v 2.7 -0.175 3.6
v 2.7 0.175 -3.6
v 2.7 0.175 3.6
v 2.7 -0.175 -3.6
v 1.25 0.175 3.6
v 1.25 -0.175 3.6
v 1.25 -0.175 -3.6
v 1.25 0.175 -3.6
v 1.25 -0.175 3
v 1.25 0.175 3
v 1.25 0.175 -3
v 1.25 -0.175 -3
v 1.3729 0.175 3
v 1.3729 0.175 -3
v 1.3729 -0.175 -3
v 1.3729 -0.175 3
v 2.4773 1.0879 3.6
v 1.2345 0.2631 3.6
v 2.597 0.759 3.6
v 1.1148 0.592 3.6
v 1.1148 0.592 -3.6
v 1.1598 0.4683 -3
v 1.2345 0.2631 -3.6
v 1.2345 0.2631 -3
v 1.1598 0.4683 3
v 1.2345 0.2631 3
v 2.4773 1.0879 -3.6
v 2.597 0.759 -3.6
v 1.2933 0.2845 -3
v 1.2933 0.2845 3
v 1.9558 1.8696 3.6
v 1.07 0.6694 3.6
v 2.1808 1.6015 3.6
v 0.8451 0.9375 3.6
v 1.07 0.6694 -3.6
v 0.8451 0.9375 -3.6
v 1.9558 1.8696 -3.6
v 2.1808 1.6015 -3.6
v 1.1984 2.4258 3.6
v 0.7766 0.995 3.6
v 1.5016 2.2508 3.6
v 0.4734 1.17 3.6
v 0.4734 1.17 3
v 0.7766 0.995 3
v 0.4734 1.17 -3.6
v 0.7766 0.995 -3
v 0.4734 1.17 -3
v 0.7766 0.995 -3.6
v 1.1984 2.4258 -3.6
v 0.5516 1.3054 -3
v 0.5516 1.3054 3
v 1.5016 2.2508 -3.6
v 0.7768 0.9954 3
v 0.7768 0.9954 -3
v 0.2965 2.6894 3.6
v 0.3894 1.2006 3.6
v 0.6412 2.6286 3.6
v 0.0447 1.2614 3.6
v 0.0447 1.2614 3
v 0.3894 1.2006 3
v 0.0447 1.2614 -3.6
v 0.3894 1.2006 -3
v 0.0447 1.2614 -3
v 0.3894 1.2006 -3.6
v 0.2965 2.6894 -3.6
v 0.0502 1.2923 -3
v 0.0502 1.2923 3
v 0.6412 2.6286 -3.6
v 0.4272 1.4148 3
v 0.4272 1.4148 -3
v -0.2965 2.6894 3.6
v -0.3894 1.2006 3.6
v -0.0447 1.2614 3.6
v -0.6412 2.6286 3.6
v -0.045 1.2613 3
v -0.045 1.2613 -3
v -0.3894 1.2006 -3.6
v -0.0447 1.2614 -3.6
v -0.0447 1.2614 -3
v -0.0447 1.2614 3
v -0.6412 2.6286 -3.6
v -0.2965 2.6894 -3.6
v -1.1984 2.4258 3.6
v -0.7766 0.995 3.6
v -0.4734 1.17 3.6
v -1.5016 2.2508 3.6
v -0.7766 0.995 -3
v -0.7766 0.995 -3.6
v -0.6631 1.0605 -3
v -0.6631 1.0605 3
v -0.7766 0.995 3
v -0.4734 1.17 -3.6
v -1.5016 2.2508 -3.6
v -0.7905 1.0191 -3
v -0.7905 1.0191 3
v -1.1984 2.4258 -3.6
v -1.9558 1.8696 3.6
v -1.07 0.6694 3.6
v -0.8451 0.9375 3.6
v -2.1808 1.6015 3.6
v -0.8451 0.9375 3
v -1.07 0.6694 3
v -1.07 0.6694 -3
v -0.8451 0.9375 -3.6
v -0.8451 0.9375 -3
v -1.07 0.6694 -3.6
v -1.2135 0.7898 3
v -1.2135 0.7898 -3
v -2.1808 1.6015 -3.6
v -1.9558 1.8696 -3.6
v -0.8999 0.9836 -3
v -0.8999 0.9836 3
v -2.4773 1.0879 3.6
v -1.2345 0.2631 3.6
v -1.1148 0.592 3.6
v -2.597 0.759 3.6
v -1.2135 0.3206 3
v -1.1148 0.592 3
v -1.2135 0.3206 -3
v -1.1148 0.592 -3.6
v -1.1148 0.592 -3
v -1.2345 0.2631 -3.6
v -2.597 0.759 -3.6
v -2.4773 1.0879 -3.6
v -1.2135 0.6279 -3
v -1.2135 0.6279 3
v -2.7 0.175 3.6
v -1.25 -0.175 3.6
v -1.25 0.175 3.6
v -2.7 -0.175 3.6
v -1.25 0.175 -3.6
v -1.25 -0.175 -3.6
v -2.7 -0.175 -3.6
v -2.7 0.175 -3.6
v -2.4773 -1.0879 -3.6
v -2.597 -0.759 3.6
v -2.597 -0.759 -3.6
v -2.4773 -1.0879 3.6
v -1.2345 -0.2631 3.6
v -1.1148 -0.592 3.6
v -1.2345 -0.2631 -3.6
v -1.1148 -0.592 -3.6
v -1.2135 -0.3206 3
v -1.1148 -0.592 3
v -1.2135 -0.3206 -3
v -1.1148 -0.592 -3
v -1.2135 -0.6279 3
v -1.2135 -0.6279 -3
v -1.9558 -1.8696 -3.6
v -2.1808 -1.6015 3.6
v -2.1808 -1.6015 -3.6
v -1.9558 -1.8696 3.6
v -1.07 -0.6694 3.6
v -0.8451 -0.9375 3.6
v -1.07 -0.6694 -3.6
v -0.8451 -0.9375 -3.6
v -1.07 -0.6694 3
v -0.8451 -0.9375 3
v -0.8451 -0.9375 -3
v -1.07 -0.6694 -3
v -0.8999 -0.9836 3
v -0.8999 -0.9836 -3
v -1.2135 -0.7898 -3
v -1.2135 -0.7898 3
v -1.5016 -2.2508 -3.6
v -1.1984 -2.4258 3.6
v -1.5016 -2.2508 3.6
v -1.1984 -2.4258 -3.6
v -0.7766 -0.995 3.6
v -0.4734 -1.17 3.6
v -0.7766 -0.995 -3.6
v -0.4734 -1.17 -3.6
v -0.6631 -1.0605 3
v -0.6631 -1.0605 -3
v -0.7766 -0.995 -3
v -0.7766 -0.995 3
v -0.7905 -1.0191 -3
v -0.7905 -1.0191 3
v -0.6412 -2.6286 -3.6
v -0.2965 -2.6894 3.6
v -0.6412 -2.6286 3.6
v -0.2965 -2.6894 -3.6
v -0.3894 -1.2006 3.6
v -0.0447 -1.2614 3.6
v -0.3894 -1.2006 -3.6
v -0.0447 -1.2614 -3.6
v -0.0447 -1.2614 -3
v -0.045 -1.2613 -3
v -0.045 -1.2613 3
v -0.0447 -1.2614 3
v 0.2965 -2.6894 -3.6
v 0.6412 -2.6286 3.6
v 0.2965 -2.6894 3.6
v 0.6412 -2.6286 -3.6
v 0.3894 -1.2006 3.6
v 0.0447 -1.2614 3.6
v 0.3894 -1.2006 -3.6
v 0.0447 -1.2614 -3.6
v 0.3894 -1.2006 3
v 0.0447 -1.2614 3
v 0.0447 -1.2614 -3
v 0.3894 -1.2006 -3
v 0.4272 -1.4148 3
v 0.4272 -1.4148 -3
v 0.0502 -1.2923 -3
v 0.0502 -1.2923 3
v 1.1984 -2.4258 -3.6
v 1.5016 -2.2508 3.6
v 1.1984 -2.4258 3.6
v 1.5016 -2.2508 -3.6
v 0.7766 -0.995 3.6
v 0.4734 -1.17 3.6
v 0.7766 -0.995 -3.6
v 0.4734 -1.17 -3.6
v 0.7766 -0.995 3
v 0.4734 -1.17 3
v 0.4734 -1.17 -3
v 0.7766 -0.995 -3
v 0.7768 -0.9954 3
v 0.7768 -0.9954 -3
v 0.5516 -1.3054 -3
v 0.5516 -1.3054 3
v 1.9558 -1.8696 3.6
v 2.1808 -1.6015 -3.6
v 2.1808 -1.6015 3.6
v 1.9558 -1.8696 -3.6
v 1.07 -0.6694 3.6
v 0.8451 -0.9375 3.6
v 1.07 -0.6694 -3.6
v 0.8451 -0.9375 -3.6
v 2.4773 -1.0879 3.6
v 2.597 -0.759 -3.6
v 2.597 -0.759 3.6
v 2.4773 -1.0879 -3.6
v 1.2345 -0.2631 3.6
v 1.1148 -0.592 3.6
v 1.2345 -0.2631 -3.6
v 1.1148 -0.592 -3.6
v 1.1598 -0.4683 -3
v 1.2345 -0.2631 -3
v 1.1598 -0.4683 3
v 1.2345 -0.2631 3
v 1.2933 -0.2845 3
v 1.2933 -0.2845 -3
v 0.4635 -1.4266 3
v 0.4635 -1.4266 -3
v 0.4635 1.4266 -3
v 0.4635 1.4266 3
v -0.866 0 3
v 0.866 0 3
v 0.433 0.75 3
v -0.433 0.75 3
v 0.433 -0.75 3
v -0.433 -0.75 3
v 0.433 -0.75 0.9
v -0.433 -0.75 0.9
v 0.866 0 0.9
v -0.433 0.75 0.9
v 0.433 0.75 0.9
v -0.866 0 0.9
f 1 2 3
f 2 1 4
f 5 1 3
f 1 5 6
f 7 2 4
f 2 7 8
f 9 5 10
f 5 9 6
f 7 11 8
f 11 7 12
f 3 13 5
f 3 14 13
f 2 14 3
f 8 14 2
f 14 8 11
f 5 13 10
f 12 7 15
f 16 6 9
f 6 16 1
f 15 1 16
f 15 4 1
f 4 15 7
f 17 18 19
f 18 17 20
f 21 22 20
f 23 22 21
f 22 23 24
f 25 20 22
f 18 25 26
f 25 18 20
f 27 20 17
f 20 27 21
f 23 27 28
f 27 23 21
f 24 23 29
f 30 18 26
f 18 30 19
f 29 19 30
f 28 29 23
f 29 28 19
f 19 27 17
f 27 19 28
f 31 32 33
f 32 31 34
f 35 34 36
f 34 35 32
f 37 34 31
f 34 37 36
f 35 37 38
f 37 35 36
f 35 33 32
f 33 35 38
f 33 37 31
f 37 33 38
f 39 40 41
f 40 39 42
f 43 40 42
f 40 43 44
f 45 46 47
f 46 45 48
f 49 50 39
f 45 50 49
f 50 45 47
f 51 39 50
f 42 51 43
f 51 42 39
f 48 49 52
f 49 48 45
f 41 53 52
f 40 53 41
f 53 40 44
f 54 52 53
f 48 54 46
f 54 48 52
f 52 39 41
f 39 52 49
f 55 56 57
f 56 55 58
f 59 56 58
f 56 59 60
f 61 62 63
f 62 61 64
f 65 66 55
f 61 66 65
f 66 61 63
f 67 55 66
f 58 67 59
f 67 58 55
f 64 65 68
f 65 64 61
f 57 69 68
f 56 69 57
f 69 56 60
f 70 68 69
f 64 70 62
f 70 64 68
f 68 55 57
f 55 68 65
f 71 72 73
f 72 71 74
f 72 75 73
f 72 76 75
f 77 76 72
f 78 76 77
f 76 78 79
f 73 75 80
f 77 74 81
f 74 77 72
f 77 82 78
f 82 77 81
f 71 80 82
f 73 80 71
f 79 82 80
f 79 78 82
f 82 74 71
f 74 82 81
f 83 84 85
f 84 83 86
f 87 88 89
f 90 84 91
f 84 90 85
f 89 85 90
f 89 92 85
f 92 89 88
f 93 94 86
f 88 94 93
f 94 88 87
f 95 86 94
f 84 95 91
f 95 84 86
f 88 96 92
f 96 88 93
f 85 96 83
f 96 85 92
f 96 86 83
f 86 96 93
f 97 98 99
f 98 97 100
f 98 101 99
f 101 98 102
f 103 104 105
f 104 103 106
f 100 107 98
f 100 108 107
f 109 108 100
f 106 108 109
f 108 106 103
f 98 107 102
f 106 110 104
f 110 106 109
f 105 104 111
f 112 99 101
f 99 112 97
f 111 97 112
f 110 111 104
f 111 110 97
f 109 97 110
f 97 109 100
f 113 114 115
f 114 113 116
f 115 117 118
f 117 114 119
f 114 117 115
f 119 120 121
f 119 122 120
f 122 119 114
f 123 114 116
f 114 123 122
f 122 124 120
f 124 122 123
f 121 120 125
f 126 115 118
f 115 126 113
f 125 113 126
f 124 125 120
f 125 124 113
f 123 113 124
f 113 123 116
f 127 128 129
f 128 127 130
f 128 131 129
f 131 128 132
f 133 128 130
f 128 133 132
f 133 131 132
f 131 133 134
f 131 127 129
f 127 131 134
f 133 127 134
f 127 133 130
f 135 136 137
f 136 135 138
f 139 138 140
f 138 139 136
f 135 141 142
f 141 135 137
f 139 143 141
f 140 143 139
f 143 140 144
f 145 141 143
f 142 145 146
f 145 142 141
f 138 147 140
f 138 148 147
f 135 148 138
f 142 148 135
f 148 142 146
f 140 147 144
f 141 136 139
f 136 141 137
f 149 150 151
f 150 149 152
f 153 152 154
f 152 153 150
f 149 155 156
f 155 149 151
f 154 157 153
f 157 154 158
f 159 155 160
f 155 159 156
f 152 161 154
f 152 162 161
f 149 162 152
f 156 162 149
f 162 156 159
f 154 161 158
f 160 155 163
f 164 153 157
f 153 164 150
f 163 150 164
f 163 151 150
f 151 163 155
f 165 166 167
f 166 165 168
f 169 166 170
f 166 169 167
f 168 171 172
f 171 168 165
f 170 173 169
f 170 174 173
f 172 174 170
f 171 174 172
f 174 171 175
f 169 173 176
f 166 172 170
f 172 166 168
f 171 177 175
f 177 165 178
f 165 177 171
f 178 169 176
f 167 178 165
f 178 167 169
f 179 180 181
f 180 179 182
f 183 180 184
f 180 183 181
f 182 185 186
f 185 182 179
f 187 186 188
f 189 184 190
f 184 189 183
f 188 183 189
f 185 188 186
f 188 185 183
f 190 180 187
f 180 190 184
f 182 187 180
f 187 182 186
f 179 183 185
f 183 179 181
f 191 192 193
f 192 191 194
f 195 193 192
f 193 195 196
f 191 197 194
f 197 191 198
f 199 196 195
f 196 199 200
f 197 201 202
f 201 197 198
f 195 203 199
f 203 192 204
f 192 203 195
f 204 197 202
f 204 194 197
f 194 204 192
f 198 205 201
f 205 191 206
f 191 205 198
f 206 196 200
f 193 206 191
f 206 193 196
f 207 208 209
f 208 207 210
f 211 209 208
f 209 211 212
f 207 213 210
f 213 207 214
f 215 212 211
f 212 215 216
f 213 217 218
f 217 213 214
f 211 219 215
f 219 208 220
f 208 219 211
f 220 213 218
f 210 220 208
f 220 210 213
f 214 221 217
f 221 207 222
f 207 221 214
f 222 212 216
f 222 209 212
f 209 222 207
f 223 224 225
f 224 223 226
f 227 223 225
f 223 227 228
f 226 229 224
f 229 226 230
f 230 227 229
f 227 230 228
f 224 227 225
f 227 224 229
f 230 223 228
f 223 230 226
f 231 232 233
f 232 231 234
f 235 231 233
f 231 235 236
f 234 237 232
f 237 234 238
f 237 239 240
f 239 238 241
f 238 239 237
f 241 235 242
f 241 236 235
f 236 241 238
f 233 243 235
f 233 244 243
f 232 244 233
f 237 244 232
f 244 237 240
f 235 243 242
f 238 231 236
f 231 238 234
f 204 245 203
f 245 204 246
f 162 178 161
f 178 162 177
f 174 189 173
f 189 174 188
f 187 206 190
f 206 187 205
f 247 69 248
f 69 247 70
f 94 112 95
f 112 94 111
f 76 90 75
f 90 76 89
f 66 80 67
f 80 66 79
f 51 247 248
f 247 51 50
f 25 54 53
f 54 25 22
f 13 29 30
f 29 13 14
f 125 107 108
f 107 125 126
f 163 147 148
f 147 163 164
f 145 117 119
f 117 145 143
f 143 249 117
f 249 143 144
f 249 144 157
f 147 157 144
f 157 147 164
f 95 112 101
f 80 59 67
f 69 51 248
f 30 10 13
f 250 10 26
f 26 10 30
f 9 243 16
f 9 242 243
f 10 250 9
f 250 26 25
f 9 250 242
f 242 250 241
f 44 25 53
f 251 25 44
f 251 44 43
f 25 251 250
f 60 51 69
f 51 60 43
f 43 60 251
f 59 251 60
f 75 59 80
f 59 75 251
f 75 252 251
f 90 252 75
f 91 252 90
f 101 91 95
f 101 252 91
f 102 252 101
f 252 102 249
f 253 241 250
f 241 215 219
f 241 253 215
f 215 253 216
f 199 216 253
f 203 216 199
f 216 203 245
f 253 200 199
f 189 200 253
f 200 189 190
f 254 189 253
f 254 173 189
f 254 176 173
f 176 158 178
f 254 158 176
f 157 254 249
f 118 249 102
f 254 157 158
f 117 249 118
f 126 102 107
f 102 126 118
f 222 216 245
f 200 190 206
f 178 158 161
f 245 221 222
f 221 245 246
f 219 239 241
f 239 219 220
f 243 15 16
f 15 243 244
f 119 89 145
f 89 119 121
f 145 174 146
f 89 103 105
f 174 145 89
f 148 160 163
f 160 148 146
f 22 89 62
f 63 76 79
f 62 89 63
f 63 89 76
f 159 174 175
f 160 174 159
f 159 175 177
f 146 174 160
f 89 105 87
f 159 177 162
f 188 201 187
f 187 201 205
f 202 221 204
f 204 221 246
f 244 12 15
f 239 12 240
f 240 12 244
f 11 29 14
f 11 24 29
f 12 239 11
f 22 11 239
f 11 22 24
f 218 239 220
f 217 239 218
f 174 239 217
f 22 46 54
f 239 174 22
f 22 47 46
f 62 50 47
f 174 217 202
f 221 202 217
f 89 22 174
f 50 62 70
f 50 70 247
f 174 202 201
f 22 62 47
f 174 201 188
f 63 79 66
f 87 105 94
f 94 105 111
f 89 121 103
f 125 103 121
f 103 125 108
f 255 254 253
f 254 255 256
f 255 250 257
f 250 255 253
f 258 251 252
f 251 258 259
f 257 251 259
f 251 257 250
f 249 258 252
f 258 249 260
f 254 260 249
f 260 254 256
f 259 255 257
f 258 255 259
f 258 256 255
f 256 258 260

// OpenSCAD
// Parameters
nominal_diameter_mm = 3; //[1.5:6:0.1]
pitch_mm = 0.5; //[0.25:1:0.05]
length_mm = 6; //[3:24:1]
socket_across_flats_mm = 1.5; //[0.8:3:0.1]
socket_depth_mm = 1.5; //[0.8:4:0.1]
end_style_flat = 1; //[0:1:1]
show_threads = 1; //[0:1:1]
overlap_mm = 1.2; //[0.5:2:0.1]  // use 1-2mm overlap for robust connectivity
thread_major_d_mm = 3; //[1.5:6:0.1]
thread_major_r_mm = 1.5; //[0.75:3:0.05]
thread_minor_r_mm = 1.25; //[0.6:2.6:0.05]
socket_hex_radius_mm = 0.866; //[0.4:1.8:0.01]
point_length_mm = 1.2; //[0.6:3:0.1]
thread_ridge_height_mm = 0.25; //[0.1:0.6:0.05]
thread_ridge_width_mm = 0.35; //[0.15:0.8:0.05]
thread_ridge_count = 18; //[6:48:1]

// Screw - complete geometry (single connected solid)
module screw() {
  color("DimGray")
  union() {
    // Main grub screw body
    cylinder(r=thread_major_r_mm, h=length_mm, center=true);

    // External "thread ridges" (kept as in original style, but unioned)
    if (show_threads == 1) {
      for (i = [0:thread_ridge_count-1]) {
        rotate([0, 0, i*360/thread_ridge_count])
          translate([thread_major_r_mm - thread_ridge_height_mm/2 + overlap_mm/2, 0, 0])
            cube([thread_ridge_height_mm + overlap_mm, thread_ridge_width_mm, length_mm + overlap_mm],
                 center=true);
      }
    }

    // End style: flat pad or point (must ADD material, not cut it)
    if (end_style_flat == 1) {
      // Small end pad that overlaps into the body by overlap_mm
      translate([0, 0, -length_mm/2 + overlap_mm/2])
        cylinder(r=thread_major_r_mm, h=overlap_mm, center=true);
    } else {
      // Point overlaps into the body by overlap_mm
      translate([0, 0, -length_mm/2 + (point_length_mm + overlap_mm)/2])
        cylinder(r1=thread_major_r_mm, r2=0, h=point_length_mm + overlap_mm, center=true);
    }

    // NOTE: Hex socket is a recess; it must be made with difference(), not union().
    // It is implemented below by subtracting it from the unioned solid.
  }
}

// Hex socket cutter (recess)
module hex_socket_cutter() {
  // Place at the top end, overlapping slightly into the body
  translate([0, 0, length_mm/2 - socket_depth_mm/2])
    cylinder(r=socket_hex_radius_mm, h=socket_depth_mm + overlap_mm, center=true, $fn=6);
}

// Final screw with socket recess (still a single connected solid)
module screw_with_socket() {
  difference() {
    screw();
    hex_socket_cutter();
  }
}

// Assembly
module assembly() {
  union() {
    screw_with_socket();
  }
}

assembly();
